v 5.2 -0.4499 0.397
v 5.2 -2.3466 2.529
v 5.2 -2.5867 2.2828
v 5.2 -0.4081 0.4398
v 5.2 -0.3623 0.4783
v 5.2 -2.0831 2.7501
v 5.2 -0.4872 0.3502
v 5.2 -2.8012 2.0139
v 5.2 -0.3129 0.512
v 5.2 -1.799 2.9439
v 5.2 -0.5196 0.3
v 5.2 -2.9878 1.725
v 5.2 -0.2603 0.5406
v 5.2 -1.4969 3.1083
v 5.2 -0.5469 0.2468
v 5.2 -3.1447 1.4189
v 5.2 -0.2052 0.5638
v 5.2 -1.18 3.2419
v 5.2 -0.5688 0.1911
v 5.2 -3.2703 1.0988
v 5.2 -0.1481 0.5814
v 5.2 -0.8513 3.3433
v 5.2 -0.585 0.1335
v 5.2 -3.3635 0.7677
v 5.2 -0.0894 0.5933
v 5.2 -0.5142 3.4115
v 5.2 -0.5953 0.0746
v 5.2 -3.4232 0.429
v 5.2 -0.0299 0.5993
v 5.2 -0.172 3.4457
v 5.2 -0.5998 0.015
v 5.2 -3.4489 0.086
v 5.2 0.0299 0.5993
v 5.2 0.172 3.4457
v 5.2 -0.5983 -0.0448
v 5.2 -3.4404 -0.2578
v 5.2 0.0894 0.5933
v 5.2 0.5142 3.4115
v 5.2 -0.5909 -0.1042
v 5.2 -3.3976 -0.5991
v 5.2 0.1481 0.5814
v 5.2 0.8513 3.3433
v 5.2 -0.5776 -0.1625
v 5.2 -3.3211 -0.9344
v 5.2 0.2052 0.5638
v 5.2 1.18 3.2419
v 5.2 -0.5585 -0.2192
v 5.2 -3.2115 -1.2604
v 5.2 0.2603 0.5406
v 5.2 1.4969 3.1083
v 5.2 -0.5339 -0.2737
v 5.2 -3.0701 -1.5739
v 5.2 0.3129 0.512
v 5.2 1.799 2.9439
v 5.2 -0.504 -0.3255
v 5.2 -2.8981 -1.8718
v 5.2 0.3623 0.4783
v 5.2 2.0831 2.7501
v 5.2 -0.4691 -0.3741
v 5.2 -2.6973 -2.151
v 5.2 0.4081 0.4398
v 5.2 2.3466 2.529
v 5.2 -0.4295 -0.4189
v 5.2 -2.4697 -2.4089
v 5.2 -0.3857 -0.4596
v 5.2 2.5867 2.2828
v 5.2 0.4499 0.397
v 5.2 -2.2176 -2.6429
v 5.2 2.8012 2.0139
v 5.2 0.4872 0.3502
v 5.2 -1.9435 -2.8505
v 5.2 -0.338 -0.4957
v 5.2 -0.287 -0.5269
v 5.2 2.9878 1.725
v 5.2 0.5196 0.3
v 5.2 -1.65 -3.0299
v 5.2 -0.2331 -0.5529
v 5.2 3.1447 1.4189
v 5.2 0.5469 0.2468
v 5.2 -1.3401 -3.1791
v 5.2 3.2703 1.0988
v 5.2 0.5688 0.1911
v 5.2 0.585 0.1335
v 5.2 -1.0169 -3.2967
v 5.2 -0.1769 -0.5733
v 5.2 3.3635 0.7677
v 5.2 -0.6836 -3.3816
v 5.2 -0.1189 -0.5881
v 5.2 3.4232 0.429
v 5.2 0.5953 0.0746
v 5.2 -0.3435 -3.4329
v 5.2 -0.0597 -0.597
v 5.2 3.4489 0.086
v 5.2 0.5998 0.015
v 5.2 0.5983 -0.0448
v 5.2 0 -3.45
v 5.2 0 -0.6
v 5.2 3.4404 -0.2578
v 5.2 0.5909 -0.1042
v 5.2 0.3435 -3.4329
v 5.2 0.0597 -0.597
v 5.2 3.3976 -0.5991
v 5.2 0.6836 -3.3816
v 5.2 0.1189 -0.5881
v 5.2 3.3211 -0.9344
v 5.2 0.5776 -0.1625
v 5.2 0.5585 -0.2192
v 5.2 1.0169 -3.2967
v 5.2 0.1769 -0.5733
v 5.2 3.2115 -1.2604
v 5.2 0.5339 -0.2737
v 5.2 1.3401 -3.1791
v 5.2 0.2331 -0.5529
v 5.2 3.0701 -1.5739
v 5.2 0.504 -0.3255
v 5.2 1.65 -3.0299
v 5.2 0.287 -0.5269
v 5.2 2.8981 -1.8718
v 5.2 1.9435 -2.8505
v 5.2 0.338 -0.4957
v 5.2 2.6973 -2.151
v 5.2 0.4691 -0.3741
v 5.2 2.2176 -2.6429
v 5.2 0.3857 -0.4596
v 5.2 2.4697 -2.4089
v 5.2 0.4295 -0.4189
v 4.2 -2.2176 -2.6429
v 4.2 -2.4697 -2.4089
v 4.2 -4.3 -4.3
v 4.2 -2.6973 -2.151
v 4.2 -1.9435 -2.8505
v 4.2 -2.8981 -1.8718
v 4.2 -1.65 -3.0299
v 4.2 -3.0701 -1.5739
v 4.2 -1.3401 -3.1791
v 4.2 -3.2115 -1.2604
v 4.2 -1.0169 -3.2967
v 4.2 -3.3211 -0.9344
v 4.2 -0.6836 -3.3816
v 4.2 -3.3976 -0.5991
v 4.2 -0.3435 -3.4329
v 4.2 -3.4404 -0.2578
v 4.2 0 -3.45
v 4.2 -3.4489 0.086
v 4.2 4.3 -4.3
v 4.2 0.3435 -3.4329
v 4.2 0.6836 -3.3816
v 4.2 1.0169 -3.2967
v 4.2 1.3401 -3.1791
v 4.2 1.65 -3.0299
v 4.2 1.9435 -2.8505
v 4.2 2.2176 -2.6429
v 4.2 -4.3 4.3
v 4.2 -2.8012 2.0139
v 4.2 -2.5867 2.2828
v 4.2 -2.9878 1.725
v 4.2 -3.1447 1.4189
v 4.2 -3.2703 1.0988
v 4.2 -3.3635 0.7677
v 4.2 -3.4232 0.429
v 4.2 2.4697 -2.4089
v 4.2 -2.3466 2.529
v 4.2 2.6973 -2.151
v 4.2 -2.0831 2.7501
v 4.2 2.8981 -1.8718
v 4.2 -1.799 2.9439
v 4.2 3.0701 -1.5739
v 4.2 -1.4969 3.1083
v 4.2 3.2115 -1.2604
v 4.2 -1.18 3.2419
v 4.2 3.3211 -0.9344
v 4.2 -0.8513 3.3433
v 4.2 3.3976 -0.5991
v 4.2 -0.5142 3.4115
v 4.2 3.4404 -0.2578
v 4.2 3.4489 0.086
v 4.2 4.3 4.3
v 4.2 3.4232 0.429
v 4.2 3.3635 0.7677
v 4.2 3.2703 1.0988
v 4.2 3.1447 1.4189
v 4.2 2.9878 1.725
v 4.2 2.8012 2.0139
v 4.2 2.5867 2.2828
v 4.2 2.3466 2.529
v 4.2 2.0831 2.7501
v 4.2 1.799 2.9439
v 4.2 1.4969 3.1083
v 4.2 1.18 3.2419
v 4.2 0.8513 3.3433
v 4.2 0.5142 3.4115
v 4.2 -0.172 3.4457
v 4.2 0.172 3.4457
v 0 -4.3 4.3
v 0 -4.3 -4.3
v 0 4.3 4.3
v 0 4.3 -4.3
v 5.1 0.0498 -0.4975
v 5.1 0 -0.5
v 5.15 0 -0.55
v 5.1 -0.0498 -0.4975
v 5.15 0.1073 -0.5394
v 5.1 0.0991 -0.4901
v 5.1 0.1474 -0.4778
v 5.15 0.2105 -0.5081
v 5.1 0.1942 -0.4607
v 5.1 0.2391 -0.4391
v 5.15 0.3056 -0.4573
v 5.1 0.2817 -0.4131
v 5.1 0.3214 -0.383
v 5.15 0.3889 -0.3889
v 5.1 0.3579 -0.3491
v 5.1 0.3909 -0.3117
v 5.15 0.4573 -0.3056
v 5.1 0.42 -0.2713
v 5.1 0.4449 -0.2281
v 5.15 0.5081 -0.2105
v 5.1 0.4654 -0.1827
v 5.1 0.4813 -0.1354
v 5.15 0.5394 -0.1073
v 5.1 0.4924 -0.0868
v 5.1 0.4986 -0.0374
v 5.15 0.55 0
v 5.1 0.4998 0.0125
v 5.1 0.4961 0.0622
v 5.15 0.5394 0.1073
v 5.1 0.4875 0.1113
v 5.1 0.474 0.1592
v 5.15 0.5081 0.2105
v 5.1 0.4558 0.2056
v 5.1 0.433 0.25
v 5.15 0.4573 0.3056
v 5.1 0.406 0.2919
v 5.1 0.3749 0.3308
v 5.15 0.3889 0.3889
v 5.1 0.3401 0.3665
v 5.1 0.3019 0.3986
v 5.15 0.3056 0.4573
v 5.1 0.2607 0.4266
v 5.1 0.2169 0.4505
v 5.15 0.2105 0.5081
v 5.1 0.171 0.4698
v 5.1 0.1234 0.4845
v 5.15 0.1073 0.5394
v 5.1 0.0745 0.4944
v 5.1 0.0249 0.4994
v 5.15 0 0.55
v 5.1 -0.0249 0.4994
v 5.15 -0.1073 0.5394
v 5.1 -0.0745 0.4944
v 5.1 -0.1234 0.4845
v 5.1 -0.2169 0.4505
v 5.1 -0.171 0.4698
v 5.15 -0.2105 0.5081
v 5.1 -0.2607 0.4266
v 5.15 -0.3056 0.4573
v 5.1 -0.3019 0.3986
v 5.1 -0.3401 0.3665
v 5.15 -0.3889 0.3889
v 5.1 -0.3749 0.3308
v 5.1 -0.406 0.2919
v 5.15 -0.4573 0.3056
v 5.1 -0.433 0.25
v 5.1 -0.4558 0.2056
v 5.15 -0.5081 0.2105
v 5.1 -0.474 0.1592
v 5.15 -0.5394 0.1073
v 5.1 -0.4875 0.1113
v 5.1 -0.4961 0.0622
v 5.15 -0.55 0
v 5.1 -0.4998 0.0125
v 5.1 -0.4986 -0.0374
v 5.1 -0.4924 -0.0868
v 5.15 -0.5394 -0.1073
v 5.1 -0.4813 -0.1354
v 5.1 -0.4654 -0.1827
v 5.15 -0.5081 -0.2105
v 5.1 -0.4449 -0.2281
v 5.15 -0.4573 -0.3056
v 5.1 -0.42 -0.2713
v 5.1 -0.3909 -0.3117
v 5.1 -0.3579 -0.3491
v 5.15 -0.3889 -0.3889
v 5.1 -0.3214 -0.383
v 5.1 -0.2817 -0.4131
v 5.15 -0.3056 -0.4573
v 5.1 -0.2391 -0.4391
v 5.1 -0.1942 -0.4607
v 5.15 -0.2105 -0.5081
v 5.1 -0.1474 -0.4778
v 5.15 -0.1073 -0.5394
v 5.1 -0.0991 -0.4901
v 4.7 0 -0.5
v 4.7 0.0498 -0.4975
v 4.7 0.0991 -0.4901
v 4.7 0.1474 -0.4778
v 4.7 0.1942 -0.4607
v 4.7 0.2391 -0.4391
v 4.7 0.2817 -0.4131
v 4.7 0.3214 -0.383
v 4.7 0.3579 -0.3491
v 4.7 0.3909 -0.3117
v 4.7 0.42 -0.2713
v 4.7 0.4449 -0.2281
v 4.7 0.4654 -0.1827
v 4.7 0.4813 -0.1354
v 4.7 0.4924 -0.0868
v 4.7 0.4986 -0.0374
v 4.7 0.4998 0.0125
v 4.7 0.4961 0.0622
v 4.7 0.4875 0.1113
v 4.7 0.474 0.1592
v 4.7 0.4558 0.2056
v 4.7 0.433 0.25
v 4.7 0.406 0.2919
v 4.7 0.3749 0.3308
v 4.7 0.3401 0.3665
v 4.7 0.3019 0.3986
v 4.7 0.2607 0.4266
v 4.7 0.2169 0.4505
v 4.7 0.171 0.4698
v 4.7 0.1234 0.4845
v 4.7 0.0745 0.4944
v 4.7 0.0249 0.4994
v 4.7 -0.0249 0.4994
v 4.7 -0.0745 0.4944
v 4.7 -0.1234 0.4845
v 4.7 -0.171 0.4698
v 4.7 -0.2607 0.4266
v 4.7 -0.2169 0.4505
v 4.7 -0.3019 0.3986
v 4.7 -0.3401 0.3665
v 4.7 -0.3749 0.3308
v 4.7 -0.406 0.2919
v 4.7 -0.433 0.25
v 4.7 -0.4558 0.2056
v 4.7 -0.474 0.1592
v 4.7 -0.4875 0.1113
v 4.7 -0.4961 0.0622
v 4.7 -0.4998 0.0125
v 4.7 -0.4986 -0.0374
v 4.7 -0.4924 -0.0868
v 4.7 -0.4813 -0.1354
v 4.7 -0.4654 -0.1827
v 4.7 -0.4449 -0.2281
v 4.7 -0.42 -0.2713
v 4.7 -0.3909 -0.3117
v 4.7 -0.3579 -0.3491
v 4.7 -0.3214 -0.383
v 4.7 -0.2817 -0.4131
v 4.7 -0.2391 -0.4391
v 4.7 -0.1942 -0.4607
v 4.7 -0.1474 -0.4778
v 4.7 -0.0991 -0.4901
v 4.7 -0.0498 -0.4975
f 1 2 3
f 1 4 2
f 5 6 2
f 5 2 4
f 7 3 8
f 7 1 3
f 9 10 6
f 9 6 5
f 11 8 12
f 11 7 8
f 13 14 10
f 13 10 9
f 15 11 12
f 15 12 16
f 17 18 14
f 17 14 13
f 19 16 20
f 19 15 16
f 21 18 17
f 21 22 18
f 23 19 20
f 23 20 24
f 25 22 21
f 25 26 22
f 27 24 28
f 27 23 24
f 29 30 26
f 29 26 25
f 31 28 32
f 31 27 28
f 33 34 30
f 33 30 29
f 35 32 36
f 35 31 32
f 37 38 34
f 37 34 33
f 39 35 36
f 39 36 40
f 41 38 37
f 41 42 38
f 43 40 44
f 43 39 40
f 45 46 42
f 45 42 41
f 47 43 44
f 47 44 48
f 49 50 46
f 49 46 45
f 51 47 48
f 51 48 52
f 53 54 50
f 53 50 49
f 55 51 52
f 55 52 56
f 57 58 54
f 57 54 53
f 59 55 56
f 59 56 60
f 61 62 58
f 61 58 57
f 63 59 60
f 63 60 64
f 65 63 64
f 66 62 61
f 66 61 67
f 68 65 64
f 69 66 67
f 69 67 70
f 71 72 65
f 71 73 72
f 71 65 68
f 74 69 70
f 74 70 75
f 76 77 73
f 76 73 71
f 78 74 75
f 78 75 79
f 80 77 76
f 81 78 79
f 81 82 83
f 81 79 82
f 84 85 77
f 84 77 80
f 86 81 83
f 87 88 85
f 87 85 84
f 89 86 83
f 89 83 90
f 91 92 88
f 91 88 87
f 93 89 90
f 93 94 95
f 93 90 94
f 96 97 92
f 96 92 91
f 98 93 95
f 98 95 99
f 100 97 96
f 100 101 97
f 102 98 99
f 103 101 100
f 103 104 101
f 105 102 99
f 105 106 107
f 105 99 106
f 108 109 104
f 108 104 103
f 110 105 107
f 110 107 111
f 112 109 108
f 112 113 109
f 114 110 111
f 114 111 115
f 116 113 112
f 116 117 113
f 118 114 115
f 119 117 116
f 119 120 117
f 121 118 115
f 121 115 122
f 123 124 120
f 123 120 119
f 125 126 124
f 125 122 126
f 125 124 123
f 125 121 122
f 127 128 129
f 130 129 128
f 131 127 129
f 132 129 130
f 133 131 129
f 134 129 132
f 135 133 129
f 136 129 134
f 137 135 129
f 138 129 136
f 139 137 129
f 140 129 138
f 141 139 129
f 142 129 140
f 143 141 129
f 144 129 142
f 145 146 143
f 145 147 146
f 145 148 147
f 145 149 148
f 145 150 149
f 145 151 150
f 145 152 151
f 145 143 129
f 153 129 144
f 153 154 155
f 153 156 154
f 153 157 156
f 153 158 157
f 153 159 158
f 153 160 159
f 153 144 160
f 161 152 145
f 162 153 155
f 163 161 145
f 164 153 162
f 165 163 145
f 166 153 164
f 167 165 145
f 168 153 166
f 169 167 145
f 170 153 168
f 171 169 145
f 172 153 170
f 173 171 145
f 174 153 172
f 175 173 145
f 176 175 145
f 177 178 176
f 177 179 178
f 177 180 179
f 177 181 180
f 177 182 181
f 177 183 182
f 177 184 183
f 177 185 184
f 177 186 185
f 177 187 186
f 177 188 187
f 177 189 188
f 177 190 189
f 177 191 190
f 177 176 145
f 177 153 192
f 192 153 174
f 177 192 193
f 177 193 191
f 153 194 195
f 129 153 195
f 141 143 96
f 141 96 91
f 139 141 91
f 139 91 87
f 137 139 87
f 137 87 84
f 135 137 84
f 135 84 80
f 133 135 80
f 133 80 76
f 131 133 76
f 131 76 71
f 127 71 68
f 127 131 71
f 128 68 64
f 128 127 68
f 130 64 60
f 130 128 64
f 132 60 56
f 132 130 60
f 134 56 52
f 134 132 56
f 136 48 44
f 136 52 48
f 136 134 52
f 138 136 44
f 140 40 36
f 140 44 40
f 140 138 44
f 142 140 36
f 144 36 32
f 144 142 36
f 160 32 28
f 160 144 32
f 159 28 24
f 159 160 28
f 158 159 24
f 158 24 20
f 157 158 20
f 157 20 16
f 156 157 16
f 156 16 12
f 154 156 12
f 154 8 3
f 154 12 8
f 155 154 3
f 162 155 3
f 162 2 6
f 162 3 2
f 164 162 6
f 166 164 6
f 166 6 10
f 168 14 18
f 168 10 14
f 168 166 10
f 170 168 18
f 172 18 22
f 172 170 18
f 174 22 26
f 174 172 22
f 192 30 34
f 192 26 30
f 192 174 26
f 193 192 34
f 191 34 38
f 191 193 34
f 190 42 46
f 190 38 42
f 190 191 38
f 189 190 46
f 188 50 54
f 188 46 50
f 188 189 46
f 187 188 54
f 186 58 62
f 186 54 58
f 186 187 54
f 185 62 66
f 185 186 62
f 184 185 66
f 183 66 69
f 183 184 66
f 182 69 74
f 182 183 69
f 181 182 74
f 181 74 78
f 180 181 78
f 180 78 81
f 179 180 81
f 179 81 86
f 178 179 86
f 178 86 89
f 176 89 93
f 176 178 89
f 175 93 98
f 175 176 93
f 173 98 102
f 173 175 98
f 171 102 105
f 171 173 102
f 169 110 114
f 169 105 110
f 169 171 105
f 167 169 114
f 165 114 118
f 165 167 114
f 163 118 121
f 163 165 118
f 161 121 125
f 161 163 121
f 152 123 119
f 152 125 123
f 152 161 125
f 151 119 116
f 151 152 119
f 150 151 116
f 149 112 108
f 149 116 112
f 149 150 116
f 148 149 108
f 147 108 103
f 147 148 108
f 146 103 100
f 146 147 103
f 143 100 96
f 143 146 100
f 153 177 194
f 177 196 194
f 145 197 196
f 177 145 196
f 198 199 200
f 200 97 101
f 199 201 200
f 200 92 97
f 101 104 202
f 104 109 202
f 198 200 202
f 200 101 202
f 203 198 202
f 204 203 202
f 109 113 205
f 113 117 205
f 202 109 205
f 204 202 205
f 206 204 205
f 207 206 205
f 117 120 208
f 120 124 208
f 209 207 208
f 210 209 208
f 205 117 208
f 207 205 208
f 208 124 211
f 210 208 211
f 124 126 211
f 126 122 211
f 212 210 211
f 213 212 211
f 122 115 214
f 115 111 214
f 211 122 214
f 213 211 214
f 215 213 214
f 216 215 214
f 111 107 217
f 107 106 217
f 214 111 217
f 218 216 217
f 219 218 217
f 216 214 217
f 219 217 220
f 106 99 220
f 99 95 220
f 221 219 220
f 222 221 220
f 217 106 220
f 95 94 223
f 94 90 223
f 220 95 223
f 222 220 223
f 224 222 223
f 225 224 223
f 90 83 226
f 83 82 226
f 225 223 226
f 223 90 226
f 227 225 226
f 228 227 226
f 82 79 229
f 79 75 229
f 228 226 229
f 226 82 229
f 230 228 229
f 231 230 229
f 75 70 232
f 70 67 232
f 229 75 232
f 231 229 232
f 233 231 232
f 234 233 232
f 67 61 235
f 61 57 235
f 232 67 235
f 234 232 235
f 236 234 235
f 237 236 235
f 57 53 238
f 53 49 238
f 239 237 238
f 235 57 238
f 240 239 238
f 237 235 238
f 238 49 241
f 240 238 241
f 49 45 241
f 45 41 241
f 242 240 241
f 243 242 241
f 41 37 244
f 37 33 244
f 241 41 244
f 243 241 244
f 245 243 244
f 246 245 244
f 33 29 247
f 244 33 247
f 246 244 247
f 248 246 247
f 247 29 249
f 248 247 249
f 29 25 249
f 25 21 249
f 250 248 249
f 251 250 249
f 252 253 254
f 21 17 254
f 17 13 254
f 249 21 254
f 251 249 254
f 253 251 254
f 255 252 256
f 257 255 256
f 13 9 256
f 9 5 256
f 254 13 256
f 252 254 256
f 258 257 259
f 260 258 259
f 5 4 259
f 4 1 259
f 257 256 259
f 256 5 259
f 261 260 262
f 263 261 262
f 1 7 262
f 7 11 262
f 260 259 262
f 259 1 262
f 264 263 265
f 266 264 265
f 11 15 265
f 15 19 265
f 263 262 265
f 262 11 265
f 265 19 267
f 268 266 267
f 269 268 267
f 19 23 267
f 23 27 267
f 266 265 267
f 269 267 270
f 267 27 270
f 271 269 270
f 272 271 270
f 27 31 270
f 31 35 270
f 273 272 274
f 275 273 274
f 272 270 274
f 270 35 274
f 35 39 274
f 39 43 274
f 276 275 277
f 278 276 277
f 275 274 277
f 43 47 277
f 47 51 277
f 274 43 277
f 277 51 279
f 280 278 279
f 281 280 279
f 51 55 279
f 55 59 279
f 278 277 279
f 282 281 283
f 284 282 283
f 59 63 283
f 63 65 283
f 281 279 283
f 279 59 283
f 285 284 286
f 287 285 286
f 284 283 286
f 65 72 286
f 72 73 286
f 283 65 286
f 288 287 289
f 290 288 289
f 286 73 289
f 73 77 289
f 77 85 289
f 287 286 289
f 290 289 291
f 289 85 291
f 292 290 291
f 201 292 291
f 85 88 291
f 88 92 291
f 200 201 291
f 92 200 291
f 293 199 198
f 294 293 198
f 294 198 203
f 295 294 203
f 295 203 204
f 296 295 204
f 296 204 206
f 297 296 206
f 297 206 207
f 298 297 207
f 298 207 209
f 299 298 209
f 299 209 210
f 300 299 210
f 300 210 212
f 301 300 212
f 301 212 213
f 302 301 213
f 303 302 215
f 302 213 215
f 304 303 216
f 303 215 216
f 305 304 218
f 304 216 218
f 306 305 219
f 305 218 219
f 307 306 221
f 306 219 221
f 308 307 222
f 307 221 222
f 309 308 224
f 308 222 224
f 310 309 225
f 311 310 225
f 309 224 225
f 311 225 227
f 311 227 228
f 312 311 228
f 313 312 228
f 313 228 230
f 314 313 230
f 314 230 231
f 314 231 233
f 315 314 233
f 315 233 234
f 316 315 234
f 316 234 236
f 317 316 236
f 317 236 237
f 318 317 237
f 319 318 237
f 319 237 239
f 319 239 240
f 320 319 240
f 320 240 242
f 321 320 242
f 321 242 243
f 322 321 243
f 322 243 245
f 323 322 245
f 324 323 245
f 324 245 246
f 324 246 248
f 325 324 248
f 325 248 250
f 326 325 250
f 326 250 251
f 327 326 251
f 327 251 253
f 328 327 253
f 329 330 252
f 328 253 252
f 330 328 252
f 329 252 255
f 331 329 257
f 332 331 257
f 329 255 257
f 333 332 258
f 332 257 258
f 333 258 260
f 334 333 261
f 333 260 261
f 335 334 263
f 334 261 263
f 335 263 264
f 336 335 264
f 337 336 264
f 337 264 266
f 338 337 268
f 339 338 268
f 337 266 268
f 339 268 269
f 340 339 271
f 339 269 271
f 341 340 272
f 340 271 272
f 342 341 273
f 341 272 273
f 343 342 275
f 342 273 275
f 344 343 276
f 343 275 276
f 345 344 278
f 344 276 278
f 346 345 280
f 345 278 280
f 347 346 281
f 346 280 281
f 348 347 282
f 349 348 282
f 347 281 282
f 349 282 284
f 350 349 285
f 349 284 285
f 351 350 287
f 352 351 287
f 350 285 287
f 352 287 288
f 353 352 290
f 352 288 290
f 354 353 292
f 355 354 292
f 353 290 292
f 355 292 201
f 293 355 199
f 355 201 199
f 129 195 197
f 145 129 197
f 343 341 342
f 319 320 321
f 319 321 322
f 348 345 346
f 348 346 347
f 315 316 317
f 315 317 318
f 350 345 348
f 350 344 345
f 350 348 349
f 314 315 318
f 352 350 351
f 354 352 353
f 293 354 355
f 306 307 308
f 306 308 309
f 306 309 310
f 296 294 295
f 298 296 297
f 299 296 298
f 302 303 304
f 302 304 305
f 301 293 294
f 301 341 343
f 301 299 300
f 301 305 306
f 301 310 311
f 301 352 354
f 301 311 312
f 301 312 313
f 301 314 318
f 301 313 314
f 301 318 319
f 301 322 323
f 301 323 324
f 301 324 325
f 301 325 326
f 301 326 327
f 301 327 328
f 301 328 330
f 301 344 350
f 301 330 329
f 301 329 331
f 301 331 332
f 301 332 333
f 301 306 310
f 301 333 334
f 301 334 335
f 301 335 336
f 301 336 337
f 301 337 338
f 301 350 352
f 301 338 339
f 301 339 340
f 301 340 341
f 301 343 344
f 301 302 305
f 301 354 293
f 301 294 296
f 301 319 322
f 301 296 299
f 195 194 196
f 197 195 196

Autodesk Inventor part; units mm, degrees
ref_plane "YZ Plane" through (0, 0, 0) normal (1, 0, 0) x (0, 1, 0)
ref_plane "XZ Plane" through (0, 0, 0) normal (0, 1, 0) x (-1, 0, 0)
ref_plane "XY Plane" through (0, 0, 0) normal (0, 0, 1) x (1, 0, 0)
sketch "스케치1" plane through (0, 0, 0) normal (1, 0, 0) x (0, 1, 0)
  line L0 (4.3, 4.3) -> (-4.3, 4.3)
  line L1 (-4.3, 4.3) -> (-4.3, -4.3)
  line L2 (-4.3, -4.3) -> (4.3, -4.3)
  line L3 (4.3, -4.3) -> (4.3, 4.3)
  line L4 (4.3, 4.3) -> (-4.3, -4.3) construction
  line L5 (-4.3, 4.3) -> (4.3, -4.3) construction
  point P0 (0, 0)
  dimension "d0" = 8.6
  dimension "d1" = 8.6
extrude "돌출1" add sketch "스케치1" along normal blind 4.2
sketch "스케치2" plane through (4.2, 0, 0) normal (1, 0, 0) x (0, 0, -1)
  circle A0 centre (0, 0) radius 3.45
  dimension "d4" = 6.9
extrude "돌출2" add sketch "스케치2" along normal blind 1
sketch "스케치3" plane through (5.2, 0, 0) normal (1, 0, 0) x (0, 0, -1)
  circle A0 centre (0, 0) radius 0.5
  dimension "d7" = 1
extrude "돌출3" cut sketch "스케치3" against normal blind 0.5
chamfer "모따기1" distance 0.1 angle 45 1 edges at (5.2, 0, 0.5)
properties part number "카메라"
